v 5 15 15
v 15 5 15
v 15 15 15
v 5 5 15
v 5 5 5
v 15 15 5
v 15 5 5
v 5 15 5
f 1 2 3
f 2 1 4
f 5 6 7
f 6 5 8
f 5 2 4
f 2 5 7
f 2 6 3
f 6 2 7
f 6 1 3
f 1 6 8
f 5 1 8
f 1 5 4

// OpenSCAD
/*
 * The root modifier (!) hides the rest of the model from view.
 */

cube([10, 10, 10]);

!translate([5, ,5, 5])
    cube([10, 10, 10]);
